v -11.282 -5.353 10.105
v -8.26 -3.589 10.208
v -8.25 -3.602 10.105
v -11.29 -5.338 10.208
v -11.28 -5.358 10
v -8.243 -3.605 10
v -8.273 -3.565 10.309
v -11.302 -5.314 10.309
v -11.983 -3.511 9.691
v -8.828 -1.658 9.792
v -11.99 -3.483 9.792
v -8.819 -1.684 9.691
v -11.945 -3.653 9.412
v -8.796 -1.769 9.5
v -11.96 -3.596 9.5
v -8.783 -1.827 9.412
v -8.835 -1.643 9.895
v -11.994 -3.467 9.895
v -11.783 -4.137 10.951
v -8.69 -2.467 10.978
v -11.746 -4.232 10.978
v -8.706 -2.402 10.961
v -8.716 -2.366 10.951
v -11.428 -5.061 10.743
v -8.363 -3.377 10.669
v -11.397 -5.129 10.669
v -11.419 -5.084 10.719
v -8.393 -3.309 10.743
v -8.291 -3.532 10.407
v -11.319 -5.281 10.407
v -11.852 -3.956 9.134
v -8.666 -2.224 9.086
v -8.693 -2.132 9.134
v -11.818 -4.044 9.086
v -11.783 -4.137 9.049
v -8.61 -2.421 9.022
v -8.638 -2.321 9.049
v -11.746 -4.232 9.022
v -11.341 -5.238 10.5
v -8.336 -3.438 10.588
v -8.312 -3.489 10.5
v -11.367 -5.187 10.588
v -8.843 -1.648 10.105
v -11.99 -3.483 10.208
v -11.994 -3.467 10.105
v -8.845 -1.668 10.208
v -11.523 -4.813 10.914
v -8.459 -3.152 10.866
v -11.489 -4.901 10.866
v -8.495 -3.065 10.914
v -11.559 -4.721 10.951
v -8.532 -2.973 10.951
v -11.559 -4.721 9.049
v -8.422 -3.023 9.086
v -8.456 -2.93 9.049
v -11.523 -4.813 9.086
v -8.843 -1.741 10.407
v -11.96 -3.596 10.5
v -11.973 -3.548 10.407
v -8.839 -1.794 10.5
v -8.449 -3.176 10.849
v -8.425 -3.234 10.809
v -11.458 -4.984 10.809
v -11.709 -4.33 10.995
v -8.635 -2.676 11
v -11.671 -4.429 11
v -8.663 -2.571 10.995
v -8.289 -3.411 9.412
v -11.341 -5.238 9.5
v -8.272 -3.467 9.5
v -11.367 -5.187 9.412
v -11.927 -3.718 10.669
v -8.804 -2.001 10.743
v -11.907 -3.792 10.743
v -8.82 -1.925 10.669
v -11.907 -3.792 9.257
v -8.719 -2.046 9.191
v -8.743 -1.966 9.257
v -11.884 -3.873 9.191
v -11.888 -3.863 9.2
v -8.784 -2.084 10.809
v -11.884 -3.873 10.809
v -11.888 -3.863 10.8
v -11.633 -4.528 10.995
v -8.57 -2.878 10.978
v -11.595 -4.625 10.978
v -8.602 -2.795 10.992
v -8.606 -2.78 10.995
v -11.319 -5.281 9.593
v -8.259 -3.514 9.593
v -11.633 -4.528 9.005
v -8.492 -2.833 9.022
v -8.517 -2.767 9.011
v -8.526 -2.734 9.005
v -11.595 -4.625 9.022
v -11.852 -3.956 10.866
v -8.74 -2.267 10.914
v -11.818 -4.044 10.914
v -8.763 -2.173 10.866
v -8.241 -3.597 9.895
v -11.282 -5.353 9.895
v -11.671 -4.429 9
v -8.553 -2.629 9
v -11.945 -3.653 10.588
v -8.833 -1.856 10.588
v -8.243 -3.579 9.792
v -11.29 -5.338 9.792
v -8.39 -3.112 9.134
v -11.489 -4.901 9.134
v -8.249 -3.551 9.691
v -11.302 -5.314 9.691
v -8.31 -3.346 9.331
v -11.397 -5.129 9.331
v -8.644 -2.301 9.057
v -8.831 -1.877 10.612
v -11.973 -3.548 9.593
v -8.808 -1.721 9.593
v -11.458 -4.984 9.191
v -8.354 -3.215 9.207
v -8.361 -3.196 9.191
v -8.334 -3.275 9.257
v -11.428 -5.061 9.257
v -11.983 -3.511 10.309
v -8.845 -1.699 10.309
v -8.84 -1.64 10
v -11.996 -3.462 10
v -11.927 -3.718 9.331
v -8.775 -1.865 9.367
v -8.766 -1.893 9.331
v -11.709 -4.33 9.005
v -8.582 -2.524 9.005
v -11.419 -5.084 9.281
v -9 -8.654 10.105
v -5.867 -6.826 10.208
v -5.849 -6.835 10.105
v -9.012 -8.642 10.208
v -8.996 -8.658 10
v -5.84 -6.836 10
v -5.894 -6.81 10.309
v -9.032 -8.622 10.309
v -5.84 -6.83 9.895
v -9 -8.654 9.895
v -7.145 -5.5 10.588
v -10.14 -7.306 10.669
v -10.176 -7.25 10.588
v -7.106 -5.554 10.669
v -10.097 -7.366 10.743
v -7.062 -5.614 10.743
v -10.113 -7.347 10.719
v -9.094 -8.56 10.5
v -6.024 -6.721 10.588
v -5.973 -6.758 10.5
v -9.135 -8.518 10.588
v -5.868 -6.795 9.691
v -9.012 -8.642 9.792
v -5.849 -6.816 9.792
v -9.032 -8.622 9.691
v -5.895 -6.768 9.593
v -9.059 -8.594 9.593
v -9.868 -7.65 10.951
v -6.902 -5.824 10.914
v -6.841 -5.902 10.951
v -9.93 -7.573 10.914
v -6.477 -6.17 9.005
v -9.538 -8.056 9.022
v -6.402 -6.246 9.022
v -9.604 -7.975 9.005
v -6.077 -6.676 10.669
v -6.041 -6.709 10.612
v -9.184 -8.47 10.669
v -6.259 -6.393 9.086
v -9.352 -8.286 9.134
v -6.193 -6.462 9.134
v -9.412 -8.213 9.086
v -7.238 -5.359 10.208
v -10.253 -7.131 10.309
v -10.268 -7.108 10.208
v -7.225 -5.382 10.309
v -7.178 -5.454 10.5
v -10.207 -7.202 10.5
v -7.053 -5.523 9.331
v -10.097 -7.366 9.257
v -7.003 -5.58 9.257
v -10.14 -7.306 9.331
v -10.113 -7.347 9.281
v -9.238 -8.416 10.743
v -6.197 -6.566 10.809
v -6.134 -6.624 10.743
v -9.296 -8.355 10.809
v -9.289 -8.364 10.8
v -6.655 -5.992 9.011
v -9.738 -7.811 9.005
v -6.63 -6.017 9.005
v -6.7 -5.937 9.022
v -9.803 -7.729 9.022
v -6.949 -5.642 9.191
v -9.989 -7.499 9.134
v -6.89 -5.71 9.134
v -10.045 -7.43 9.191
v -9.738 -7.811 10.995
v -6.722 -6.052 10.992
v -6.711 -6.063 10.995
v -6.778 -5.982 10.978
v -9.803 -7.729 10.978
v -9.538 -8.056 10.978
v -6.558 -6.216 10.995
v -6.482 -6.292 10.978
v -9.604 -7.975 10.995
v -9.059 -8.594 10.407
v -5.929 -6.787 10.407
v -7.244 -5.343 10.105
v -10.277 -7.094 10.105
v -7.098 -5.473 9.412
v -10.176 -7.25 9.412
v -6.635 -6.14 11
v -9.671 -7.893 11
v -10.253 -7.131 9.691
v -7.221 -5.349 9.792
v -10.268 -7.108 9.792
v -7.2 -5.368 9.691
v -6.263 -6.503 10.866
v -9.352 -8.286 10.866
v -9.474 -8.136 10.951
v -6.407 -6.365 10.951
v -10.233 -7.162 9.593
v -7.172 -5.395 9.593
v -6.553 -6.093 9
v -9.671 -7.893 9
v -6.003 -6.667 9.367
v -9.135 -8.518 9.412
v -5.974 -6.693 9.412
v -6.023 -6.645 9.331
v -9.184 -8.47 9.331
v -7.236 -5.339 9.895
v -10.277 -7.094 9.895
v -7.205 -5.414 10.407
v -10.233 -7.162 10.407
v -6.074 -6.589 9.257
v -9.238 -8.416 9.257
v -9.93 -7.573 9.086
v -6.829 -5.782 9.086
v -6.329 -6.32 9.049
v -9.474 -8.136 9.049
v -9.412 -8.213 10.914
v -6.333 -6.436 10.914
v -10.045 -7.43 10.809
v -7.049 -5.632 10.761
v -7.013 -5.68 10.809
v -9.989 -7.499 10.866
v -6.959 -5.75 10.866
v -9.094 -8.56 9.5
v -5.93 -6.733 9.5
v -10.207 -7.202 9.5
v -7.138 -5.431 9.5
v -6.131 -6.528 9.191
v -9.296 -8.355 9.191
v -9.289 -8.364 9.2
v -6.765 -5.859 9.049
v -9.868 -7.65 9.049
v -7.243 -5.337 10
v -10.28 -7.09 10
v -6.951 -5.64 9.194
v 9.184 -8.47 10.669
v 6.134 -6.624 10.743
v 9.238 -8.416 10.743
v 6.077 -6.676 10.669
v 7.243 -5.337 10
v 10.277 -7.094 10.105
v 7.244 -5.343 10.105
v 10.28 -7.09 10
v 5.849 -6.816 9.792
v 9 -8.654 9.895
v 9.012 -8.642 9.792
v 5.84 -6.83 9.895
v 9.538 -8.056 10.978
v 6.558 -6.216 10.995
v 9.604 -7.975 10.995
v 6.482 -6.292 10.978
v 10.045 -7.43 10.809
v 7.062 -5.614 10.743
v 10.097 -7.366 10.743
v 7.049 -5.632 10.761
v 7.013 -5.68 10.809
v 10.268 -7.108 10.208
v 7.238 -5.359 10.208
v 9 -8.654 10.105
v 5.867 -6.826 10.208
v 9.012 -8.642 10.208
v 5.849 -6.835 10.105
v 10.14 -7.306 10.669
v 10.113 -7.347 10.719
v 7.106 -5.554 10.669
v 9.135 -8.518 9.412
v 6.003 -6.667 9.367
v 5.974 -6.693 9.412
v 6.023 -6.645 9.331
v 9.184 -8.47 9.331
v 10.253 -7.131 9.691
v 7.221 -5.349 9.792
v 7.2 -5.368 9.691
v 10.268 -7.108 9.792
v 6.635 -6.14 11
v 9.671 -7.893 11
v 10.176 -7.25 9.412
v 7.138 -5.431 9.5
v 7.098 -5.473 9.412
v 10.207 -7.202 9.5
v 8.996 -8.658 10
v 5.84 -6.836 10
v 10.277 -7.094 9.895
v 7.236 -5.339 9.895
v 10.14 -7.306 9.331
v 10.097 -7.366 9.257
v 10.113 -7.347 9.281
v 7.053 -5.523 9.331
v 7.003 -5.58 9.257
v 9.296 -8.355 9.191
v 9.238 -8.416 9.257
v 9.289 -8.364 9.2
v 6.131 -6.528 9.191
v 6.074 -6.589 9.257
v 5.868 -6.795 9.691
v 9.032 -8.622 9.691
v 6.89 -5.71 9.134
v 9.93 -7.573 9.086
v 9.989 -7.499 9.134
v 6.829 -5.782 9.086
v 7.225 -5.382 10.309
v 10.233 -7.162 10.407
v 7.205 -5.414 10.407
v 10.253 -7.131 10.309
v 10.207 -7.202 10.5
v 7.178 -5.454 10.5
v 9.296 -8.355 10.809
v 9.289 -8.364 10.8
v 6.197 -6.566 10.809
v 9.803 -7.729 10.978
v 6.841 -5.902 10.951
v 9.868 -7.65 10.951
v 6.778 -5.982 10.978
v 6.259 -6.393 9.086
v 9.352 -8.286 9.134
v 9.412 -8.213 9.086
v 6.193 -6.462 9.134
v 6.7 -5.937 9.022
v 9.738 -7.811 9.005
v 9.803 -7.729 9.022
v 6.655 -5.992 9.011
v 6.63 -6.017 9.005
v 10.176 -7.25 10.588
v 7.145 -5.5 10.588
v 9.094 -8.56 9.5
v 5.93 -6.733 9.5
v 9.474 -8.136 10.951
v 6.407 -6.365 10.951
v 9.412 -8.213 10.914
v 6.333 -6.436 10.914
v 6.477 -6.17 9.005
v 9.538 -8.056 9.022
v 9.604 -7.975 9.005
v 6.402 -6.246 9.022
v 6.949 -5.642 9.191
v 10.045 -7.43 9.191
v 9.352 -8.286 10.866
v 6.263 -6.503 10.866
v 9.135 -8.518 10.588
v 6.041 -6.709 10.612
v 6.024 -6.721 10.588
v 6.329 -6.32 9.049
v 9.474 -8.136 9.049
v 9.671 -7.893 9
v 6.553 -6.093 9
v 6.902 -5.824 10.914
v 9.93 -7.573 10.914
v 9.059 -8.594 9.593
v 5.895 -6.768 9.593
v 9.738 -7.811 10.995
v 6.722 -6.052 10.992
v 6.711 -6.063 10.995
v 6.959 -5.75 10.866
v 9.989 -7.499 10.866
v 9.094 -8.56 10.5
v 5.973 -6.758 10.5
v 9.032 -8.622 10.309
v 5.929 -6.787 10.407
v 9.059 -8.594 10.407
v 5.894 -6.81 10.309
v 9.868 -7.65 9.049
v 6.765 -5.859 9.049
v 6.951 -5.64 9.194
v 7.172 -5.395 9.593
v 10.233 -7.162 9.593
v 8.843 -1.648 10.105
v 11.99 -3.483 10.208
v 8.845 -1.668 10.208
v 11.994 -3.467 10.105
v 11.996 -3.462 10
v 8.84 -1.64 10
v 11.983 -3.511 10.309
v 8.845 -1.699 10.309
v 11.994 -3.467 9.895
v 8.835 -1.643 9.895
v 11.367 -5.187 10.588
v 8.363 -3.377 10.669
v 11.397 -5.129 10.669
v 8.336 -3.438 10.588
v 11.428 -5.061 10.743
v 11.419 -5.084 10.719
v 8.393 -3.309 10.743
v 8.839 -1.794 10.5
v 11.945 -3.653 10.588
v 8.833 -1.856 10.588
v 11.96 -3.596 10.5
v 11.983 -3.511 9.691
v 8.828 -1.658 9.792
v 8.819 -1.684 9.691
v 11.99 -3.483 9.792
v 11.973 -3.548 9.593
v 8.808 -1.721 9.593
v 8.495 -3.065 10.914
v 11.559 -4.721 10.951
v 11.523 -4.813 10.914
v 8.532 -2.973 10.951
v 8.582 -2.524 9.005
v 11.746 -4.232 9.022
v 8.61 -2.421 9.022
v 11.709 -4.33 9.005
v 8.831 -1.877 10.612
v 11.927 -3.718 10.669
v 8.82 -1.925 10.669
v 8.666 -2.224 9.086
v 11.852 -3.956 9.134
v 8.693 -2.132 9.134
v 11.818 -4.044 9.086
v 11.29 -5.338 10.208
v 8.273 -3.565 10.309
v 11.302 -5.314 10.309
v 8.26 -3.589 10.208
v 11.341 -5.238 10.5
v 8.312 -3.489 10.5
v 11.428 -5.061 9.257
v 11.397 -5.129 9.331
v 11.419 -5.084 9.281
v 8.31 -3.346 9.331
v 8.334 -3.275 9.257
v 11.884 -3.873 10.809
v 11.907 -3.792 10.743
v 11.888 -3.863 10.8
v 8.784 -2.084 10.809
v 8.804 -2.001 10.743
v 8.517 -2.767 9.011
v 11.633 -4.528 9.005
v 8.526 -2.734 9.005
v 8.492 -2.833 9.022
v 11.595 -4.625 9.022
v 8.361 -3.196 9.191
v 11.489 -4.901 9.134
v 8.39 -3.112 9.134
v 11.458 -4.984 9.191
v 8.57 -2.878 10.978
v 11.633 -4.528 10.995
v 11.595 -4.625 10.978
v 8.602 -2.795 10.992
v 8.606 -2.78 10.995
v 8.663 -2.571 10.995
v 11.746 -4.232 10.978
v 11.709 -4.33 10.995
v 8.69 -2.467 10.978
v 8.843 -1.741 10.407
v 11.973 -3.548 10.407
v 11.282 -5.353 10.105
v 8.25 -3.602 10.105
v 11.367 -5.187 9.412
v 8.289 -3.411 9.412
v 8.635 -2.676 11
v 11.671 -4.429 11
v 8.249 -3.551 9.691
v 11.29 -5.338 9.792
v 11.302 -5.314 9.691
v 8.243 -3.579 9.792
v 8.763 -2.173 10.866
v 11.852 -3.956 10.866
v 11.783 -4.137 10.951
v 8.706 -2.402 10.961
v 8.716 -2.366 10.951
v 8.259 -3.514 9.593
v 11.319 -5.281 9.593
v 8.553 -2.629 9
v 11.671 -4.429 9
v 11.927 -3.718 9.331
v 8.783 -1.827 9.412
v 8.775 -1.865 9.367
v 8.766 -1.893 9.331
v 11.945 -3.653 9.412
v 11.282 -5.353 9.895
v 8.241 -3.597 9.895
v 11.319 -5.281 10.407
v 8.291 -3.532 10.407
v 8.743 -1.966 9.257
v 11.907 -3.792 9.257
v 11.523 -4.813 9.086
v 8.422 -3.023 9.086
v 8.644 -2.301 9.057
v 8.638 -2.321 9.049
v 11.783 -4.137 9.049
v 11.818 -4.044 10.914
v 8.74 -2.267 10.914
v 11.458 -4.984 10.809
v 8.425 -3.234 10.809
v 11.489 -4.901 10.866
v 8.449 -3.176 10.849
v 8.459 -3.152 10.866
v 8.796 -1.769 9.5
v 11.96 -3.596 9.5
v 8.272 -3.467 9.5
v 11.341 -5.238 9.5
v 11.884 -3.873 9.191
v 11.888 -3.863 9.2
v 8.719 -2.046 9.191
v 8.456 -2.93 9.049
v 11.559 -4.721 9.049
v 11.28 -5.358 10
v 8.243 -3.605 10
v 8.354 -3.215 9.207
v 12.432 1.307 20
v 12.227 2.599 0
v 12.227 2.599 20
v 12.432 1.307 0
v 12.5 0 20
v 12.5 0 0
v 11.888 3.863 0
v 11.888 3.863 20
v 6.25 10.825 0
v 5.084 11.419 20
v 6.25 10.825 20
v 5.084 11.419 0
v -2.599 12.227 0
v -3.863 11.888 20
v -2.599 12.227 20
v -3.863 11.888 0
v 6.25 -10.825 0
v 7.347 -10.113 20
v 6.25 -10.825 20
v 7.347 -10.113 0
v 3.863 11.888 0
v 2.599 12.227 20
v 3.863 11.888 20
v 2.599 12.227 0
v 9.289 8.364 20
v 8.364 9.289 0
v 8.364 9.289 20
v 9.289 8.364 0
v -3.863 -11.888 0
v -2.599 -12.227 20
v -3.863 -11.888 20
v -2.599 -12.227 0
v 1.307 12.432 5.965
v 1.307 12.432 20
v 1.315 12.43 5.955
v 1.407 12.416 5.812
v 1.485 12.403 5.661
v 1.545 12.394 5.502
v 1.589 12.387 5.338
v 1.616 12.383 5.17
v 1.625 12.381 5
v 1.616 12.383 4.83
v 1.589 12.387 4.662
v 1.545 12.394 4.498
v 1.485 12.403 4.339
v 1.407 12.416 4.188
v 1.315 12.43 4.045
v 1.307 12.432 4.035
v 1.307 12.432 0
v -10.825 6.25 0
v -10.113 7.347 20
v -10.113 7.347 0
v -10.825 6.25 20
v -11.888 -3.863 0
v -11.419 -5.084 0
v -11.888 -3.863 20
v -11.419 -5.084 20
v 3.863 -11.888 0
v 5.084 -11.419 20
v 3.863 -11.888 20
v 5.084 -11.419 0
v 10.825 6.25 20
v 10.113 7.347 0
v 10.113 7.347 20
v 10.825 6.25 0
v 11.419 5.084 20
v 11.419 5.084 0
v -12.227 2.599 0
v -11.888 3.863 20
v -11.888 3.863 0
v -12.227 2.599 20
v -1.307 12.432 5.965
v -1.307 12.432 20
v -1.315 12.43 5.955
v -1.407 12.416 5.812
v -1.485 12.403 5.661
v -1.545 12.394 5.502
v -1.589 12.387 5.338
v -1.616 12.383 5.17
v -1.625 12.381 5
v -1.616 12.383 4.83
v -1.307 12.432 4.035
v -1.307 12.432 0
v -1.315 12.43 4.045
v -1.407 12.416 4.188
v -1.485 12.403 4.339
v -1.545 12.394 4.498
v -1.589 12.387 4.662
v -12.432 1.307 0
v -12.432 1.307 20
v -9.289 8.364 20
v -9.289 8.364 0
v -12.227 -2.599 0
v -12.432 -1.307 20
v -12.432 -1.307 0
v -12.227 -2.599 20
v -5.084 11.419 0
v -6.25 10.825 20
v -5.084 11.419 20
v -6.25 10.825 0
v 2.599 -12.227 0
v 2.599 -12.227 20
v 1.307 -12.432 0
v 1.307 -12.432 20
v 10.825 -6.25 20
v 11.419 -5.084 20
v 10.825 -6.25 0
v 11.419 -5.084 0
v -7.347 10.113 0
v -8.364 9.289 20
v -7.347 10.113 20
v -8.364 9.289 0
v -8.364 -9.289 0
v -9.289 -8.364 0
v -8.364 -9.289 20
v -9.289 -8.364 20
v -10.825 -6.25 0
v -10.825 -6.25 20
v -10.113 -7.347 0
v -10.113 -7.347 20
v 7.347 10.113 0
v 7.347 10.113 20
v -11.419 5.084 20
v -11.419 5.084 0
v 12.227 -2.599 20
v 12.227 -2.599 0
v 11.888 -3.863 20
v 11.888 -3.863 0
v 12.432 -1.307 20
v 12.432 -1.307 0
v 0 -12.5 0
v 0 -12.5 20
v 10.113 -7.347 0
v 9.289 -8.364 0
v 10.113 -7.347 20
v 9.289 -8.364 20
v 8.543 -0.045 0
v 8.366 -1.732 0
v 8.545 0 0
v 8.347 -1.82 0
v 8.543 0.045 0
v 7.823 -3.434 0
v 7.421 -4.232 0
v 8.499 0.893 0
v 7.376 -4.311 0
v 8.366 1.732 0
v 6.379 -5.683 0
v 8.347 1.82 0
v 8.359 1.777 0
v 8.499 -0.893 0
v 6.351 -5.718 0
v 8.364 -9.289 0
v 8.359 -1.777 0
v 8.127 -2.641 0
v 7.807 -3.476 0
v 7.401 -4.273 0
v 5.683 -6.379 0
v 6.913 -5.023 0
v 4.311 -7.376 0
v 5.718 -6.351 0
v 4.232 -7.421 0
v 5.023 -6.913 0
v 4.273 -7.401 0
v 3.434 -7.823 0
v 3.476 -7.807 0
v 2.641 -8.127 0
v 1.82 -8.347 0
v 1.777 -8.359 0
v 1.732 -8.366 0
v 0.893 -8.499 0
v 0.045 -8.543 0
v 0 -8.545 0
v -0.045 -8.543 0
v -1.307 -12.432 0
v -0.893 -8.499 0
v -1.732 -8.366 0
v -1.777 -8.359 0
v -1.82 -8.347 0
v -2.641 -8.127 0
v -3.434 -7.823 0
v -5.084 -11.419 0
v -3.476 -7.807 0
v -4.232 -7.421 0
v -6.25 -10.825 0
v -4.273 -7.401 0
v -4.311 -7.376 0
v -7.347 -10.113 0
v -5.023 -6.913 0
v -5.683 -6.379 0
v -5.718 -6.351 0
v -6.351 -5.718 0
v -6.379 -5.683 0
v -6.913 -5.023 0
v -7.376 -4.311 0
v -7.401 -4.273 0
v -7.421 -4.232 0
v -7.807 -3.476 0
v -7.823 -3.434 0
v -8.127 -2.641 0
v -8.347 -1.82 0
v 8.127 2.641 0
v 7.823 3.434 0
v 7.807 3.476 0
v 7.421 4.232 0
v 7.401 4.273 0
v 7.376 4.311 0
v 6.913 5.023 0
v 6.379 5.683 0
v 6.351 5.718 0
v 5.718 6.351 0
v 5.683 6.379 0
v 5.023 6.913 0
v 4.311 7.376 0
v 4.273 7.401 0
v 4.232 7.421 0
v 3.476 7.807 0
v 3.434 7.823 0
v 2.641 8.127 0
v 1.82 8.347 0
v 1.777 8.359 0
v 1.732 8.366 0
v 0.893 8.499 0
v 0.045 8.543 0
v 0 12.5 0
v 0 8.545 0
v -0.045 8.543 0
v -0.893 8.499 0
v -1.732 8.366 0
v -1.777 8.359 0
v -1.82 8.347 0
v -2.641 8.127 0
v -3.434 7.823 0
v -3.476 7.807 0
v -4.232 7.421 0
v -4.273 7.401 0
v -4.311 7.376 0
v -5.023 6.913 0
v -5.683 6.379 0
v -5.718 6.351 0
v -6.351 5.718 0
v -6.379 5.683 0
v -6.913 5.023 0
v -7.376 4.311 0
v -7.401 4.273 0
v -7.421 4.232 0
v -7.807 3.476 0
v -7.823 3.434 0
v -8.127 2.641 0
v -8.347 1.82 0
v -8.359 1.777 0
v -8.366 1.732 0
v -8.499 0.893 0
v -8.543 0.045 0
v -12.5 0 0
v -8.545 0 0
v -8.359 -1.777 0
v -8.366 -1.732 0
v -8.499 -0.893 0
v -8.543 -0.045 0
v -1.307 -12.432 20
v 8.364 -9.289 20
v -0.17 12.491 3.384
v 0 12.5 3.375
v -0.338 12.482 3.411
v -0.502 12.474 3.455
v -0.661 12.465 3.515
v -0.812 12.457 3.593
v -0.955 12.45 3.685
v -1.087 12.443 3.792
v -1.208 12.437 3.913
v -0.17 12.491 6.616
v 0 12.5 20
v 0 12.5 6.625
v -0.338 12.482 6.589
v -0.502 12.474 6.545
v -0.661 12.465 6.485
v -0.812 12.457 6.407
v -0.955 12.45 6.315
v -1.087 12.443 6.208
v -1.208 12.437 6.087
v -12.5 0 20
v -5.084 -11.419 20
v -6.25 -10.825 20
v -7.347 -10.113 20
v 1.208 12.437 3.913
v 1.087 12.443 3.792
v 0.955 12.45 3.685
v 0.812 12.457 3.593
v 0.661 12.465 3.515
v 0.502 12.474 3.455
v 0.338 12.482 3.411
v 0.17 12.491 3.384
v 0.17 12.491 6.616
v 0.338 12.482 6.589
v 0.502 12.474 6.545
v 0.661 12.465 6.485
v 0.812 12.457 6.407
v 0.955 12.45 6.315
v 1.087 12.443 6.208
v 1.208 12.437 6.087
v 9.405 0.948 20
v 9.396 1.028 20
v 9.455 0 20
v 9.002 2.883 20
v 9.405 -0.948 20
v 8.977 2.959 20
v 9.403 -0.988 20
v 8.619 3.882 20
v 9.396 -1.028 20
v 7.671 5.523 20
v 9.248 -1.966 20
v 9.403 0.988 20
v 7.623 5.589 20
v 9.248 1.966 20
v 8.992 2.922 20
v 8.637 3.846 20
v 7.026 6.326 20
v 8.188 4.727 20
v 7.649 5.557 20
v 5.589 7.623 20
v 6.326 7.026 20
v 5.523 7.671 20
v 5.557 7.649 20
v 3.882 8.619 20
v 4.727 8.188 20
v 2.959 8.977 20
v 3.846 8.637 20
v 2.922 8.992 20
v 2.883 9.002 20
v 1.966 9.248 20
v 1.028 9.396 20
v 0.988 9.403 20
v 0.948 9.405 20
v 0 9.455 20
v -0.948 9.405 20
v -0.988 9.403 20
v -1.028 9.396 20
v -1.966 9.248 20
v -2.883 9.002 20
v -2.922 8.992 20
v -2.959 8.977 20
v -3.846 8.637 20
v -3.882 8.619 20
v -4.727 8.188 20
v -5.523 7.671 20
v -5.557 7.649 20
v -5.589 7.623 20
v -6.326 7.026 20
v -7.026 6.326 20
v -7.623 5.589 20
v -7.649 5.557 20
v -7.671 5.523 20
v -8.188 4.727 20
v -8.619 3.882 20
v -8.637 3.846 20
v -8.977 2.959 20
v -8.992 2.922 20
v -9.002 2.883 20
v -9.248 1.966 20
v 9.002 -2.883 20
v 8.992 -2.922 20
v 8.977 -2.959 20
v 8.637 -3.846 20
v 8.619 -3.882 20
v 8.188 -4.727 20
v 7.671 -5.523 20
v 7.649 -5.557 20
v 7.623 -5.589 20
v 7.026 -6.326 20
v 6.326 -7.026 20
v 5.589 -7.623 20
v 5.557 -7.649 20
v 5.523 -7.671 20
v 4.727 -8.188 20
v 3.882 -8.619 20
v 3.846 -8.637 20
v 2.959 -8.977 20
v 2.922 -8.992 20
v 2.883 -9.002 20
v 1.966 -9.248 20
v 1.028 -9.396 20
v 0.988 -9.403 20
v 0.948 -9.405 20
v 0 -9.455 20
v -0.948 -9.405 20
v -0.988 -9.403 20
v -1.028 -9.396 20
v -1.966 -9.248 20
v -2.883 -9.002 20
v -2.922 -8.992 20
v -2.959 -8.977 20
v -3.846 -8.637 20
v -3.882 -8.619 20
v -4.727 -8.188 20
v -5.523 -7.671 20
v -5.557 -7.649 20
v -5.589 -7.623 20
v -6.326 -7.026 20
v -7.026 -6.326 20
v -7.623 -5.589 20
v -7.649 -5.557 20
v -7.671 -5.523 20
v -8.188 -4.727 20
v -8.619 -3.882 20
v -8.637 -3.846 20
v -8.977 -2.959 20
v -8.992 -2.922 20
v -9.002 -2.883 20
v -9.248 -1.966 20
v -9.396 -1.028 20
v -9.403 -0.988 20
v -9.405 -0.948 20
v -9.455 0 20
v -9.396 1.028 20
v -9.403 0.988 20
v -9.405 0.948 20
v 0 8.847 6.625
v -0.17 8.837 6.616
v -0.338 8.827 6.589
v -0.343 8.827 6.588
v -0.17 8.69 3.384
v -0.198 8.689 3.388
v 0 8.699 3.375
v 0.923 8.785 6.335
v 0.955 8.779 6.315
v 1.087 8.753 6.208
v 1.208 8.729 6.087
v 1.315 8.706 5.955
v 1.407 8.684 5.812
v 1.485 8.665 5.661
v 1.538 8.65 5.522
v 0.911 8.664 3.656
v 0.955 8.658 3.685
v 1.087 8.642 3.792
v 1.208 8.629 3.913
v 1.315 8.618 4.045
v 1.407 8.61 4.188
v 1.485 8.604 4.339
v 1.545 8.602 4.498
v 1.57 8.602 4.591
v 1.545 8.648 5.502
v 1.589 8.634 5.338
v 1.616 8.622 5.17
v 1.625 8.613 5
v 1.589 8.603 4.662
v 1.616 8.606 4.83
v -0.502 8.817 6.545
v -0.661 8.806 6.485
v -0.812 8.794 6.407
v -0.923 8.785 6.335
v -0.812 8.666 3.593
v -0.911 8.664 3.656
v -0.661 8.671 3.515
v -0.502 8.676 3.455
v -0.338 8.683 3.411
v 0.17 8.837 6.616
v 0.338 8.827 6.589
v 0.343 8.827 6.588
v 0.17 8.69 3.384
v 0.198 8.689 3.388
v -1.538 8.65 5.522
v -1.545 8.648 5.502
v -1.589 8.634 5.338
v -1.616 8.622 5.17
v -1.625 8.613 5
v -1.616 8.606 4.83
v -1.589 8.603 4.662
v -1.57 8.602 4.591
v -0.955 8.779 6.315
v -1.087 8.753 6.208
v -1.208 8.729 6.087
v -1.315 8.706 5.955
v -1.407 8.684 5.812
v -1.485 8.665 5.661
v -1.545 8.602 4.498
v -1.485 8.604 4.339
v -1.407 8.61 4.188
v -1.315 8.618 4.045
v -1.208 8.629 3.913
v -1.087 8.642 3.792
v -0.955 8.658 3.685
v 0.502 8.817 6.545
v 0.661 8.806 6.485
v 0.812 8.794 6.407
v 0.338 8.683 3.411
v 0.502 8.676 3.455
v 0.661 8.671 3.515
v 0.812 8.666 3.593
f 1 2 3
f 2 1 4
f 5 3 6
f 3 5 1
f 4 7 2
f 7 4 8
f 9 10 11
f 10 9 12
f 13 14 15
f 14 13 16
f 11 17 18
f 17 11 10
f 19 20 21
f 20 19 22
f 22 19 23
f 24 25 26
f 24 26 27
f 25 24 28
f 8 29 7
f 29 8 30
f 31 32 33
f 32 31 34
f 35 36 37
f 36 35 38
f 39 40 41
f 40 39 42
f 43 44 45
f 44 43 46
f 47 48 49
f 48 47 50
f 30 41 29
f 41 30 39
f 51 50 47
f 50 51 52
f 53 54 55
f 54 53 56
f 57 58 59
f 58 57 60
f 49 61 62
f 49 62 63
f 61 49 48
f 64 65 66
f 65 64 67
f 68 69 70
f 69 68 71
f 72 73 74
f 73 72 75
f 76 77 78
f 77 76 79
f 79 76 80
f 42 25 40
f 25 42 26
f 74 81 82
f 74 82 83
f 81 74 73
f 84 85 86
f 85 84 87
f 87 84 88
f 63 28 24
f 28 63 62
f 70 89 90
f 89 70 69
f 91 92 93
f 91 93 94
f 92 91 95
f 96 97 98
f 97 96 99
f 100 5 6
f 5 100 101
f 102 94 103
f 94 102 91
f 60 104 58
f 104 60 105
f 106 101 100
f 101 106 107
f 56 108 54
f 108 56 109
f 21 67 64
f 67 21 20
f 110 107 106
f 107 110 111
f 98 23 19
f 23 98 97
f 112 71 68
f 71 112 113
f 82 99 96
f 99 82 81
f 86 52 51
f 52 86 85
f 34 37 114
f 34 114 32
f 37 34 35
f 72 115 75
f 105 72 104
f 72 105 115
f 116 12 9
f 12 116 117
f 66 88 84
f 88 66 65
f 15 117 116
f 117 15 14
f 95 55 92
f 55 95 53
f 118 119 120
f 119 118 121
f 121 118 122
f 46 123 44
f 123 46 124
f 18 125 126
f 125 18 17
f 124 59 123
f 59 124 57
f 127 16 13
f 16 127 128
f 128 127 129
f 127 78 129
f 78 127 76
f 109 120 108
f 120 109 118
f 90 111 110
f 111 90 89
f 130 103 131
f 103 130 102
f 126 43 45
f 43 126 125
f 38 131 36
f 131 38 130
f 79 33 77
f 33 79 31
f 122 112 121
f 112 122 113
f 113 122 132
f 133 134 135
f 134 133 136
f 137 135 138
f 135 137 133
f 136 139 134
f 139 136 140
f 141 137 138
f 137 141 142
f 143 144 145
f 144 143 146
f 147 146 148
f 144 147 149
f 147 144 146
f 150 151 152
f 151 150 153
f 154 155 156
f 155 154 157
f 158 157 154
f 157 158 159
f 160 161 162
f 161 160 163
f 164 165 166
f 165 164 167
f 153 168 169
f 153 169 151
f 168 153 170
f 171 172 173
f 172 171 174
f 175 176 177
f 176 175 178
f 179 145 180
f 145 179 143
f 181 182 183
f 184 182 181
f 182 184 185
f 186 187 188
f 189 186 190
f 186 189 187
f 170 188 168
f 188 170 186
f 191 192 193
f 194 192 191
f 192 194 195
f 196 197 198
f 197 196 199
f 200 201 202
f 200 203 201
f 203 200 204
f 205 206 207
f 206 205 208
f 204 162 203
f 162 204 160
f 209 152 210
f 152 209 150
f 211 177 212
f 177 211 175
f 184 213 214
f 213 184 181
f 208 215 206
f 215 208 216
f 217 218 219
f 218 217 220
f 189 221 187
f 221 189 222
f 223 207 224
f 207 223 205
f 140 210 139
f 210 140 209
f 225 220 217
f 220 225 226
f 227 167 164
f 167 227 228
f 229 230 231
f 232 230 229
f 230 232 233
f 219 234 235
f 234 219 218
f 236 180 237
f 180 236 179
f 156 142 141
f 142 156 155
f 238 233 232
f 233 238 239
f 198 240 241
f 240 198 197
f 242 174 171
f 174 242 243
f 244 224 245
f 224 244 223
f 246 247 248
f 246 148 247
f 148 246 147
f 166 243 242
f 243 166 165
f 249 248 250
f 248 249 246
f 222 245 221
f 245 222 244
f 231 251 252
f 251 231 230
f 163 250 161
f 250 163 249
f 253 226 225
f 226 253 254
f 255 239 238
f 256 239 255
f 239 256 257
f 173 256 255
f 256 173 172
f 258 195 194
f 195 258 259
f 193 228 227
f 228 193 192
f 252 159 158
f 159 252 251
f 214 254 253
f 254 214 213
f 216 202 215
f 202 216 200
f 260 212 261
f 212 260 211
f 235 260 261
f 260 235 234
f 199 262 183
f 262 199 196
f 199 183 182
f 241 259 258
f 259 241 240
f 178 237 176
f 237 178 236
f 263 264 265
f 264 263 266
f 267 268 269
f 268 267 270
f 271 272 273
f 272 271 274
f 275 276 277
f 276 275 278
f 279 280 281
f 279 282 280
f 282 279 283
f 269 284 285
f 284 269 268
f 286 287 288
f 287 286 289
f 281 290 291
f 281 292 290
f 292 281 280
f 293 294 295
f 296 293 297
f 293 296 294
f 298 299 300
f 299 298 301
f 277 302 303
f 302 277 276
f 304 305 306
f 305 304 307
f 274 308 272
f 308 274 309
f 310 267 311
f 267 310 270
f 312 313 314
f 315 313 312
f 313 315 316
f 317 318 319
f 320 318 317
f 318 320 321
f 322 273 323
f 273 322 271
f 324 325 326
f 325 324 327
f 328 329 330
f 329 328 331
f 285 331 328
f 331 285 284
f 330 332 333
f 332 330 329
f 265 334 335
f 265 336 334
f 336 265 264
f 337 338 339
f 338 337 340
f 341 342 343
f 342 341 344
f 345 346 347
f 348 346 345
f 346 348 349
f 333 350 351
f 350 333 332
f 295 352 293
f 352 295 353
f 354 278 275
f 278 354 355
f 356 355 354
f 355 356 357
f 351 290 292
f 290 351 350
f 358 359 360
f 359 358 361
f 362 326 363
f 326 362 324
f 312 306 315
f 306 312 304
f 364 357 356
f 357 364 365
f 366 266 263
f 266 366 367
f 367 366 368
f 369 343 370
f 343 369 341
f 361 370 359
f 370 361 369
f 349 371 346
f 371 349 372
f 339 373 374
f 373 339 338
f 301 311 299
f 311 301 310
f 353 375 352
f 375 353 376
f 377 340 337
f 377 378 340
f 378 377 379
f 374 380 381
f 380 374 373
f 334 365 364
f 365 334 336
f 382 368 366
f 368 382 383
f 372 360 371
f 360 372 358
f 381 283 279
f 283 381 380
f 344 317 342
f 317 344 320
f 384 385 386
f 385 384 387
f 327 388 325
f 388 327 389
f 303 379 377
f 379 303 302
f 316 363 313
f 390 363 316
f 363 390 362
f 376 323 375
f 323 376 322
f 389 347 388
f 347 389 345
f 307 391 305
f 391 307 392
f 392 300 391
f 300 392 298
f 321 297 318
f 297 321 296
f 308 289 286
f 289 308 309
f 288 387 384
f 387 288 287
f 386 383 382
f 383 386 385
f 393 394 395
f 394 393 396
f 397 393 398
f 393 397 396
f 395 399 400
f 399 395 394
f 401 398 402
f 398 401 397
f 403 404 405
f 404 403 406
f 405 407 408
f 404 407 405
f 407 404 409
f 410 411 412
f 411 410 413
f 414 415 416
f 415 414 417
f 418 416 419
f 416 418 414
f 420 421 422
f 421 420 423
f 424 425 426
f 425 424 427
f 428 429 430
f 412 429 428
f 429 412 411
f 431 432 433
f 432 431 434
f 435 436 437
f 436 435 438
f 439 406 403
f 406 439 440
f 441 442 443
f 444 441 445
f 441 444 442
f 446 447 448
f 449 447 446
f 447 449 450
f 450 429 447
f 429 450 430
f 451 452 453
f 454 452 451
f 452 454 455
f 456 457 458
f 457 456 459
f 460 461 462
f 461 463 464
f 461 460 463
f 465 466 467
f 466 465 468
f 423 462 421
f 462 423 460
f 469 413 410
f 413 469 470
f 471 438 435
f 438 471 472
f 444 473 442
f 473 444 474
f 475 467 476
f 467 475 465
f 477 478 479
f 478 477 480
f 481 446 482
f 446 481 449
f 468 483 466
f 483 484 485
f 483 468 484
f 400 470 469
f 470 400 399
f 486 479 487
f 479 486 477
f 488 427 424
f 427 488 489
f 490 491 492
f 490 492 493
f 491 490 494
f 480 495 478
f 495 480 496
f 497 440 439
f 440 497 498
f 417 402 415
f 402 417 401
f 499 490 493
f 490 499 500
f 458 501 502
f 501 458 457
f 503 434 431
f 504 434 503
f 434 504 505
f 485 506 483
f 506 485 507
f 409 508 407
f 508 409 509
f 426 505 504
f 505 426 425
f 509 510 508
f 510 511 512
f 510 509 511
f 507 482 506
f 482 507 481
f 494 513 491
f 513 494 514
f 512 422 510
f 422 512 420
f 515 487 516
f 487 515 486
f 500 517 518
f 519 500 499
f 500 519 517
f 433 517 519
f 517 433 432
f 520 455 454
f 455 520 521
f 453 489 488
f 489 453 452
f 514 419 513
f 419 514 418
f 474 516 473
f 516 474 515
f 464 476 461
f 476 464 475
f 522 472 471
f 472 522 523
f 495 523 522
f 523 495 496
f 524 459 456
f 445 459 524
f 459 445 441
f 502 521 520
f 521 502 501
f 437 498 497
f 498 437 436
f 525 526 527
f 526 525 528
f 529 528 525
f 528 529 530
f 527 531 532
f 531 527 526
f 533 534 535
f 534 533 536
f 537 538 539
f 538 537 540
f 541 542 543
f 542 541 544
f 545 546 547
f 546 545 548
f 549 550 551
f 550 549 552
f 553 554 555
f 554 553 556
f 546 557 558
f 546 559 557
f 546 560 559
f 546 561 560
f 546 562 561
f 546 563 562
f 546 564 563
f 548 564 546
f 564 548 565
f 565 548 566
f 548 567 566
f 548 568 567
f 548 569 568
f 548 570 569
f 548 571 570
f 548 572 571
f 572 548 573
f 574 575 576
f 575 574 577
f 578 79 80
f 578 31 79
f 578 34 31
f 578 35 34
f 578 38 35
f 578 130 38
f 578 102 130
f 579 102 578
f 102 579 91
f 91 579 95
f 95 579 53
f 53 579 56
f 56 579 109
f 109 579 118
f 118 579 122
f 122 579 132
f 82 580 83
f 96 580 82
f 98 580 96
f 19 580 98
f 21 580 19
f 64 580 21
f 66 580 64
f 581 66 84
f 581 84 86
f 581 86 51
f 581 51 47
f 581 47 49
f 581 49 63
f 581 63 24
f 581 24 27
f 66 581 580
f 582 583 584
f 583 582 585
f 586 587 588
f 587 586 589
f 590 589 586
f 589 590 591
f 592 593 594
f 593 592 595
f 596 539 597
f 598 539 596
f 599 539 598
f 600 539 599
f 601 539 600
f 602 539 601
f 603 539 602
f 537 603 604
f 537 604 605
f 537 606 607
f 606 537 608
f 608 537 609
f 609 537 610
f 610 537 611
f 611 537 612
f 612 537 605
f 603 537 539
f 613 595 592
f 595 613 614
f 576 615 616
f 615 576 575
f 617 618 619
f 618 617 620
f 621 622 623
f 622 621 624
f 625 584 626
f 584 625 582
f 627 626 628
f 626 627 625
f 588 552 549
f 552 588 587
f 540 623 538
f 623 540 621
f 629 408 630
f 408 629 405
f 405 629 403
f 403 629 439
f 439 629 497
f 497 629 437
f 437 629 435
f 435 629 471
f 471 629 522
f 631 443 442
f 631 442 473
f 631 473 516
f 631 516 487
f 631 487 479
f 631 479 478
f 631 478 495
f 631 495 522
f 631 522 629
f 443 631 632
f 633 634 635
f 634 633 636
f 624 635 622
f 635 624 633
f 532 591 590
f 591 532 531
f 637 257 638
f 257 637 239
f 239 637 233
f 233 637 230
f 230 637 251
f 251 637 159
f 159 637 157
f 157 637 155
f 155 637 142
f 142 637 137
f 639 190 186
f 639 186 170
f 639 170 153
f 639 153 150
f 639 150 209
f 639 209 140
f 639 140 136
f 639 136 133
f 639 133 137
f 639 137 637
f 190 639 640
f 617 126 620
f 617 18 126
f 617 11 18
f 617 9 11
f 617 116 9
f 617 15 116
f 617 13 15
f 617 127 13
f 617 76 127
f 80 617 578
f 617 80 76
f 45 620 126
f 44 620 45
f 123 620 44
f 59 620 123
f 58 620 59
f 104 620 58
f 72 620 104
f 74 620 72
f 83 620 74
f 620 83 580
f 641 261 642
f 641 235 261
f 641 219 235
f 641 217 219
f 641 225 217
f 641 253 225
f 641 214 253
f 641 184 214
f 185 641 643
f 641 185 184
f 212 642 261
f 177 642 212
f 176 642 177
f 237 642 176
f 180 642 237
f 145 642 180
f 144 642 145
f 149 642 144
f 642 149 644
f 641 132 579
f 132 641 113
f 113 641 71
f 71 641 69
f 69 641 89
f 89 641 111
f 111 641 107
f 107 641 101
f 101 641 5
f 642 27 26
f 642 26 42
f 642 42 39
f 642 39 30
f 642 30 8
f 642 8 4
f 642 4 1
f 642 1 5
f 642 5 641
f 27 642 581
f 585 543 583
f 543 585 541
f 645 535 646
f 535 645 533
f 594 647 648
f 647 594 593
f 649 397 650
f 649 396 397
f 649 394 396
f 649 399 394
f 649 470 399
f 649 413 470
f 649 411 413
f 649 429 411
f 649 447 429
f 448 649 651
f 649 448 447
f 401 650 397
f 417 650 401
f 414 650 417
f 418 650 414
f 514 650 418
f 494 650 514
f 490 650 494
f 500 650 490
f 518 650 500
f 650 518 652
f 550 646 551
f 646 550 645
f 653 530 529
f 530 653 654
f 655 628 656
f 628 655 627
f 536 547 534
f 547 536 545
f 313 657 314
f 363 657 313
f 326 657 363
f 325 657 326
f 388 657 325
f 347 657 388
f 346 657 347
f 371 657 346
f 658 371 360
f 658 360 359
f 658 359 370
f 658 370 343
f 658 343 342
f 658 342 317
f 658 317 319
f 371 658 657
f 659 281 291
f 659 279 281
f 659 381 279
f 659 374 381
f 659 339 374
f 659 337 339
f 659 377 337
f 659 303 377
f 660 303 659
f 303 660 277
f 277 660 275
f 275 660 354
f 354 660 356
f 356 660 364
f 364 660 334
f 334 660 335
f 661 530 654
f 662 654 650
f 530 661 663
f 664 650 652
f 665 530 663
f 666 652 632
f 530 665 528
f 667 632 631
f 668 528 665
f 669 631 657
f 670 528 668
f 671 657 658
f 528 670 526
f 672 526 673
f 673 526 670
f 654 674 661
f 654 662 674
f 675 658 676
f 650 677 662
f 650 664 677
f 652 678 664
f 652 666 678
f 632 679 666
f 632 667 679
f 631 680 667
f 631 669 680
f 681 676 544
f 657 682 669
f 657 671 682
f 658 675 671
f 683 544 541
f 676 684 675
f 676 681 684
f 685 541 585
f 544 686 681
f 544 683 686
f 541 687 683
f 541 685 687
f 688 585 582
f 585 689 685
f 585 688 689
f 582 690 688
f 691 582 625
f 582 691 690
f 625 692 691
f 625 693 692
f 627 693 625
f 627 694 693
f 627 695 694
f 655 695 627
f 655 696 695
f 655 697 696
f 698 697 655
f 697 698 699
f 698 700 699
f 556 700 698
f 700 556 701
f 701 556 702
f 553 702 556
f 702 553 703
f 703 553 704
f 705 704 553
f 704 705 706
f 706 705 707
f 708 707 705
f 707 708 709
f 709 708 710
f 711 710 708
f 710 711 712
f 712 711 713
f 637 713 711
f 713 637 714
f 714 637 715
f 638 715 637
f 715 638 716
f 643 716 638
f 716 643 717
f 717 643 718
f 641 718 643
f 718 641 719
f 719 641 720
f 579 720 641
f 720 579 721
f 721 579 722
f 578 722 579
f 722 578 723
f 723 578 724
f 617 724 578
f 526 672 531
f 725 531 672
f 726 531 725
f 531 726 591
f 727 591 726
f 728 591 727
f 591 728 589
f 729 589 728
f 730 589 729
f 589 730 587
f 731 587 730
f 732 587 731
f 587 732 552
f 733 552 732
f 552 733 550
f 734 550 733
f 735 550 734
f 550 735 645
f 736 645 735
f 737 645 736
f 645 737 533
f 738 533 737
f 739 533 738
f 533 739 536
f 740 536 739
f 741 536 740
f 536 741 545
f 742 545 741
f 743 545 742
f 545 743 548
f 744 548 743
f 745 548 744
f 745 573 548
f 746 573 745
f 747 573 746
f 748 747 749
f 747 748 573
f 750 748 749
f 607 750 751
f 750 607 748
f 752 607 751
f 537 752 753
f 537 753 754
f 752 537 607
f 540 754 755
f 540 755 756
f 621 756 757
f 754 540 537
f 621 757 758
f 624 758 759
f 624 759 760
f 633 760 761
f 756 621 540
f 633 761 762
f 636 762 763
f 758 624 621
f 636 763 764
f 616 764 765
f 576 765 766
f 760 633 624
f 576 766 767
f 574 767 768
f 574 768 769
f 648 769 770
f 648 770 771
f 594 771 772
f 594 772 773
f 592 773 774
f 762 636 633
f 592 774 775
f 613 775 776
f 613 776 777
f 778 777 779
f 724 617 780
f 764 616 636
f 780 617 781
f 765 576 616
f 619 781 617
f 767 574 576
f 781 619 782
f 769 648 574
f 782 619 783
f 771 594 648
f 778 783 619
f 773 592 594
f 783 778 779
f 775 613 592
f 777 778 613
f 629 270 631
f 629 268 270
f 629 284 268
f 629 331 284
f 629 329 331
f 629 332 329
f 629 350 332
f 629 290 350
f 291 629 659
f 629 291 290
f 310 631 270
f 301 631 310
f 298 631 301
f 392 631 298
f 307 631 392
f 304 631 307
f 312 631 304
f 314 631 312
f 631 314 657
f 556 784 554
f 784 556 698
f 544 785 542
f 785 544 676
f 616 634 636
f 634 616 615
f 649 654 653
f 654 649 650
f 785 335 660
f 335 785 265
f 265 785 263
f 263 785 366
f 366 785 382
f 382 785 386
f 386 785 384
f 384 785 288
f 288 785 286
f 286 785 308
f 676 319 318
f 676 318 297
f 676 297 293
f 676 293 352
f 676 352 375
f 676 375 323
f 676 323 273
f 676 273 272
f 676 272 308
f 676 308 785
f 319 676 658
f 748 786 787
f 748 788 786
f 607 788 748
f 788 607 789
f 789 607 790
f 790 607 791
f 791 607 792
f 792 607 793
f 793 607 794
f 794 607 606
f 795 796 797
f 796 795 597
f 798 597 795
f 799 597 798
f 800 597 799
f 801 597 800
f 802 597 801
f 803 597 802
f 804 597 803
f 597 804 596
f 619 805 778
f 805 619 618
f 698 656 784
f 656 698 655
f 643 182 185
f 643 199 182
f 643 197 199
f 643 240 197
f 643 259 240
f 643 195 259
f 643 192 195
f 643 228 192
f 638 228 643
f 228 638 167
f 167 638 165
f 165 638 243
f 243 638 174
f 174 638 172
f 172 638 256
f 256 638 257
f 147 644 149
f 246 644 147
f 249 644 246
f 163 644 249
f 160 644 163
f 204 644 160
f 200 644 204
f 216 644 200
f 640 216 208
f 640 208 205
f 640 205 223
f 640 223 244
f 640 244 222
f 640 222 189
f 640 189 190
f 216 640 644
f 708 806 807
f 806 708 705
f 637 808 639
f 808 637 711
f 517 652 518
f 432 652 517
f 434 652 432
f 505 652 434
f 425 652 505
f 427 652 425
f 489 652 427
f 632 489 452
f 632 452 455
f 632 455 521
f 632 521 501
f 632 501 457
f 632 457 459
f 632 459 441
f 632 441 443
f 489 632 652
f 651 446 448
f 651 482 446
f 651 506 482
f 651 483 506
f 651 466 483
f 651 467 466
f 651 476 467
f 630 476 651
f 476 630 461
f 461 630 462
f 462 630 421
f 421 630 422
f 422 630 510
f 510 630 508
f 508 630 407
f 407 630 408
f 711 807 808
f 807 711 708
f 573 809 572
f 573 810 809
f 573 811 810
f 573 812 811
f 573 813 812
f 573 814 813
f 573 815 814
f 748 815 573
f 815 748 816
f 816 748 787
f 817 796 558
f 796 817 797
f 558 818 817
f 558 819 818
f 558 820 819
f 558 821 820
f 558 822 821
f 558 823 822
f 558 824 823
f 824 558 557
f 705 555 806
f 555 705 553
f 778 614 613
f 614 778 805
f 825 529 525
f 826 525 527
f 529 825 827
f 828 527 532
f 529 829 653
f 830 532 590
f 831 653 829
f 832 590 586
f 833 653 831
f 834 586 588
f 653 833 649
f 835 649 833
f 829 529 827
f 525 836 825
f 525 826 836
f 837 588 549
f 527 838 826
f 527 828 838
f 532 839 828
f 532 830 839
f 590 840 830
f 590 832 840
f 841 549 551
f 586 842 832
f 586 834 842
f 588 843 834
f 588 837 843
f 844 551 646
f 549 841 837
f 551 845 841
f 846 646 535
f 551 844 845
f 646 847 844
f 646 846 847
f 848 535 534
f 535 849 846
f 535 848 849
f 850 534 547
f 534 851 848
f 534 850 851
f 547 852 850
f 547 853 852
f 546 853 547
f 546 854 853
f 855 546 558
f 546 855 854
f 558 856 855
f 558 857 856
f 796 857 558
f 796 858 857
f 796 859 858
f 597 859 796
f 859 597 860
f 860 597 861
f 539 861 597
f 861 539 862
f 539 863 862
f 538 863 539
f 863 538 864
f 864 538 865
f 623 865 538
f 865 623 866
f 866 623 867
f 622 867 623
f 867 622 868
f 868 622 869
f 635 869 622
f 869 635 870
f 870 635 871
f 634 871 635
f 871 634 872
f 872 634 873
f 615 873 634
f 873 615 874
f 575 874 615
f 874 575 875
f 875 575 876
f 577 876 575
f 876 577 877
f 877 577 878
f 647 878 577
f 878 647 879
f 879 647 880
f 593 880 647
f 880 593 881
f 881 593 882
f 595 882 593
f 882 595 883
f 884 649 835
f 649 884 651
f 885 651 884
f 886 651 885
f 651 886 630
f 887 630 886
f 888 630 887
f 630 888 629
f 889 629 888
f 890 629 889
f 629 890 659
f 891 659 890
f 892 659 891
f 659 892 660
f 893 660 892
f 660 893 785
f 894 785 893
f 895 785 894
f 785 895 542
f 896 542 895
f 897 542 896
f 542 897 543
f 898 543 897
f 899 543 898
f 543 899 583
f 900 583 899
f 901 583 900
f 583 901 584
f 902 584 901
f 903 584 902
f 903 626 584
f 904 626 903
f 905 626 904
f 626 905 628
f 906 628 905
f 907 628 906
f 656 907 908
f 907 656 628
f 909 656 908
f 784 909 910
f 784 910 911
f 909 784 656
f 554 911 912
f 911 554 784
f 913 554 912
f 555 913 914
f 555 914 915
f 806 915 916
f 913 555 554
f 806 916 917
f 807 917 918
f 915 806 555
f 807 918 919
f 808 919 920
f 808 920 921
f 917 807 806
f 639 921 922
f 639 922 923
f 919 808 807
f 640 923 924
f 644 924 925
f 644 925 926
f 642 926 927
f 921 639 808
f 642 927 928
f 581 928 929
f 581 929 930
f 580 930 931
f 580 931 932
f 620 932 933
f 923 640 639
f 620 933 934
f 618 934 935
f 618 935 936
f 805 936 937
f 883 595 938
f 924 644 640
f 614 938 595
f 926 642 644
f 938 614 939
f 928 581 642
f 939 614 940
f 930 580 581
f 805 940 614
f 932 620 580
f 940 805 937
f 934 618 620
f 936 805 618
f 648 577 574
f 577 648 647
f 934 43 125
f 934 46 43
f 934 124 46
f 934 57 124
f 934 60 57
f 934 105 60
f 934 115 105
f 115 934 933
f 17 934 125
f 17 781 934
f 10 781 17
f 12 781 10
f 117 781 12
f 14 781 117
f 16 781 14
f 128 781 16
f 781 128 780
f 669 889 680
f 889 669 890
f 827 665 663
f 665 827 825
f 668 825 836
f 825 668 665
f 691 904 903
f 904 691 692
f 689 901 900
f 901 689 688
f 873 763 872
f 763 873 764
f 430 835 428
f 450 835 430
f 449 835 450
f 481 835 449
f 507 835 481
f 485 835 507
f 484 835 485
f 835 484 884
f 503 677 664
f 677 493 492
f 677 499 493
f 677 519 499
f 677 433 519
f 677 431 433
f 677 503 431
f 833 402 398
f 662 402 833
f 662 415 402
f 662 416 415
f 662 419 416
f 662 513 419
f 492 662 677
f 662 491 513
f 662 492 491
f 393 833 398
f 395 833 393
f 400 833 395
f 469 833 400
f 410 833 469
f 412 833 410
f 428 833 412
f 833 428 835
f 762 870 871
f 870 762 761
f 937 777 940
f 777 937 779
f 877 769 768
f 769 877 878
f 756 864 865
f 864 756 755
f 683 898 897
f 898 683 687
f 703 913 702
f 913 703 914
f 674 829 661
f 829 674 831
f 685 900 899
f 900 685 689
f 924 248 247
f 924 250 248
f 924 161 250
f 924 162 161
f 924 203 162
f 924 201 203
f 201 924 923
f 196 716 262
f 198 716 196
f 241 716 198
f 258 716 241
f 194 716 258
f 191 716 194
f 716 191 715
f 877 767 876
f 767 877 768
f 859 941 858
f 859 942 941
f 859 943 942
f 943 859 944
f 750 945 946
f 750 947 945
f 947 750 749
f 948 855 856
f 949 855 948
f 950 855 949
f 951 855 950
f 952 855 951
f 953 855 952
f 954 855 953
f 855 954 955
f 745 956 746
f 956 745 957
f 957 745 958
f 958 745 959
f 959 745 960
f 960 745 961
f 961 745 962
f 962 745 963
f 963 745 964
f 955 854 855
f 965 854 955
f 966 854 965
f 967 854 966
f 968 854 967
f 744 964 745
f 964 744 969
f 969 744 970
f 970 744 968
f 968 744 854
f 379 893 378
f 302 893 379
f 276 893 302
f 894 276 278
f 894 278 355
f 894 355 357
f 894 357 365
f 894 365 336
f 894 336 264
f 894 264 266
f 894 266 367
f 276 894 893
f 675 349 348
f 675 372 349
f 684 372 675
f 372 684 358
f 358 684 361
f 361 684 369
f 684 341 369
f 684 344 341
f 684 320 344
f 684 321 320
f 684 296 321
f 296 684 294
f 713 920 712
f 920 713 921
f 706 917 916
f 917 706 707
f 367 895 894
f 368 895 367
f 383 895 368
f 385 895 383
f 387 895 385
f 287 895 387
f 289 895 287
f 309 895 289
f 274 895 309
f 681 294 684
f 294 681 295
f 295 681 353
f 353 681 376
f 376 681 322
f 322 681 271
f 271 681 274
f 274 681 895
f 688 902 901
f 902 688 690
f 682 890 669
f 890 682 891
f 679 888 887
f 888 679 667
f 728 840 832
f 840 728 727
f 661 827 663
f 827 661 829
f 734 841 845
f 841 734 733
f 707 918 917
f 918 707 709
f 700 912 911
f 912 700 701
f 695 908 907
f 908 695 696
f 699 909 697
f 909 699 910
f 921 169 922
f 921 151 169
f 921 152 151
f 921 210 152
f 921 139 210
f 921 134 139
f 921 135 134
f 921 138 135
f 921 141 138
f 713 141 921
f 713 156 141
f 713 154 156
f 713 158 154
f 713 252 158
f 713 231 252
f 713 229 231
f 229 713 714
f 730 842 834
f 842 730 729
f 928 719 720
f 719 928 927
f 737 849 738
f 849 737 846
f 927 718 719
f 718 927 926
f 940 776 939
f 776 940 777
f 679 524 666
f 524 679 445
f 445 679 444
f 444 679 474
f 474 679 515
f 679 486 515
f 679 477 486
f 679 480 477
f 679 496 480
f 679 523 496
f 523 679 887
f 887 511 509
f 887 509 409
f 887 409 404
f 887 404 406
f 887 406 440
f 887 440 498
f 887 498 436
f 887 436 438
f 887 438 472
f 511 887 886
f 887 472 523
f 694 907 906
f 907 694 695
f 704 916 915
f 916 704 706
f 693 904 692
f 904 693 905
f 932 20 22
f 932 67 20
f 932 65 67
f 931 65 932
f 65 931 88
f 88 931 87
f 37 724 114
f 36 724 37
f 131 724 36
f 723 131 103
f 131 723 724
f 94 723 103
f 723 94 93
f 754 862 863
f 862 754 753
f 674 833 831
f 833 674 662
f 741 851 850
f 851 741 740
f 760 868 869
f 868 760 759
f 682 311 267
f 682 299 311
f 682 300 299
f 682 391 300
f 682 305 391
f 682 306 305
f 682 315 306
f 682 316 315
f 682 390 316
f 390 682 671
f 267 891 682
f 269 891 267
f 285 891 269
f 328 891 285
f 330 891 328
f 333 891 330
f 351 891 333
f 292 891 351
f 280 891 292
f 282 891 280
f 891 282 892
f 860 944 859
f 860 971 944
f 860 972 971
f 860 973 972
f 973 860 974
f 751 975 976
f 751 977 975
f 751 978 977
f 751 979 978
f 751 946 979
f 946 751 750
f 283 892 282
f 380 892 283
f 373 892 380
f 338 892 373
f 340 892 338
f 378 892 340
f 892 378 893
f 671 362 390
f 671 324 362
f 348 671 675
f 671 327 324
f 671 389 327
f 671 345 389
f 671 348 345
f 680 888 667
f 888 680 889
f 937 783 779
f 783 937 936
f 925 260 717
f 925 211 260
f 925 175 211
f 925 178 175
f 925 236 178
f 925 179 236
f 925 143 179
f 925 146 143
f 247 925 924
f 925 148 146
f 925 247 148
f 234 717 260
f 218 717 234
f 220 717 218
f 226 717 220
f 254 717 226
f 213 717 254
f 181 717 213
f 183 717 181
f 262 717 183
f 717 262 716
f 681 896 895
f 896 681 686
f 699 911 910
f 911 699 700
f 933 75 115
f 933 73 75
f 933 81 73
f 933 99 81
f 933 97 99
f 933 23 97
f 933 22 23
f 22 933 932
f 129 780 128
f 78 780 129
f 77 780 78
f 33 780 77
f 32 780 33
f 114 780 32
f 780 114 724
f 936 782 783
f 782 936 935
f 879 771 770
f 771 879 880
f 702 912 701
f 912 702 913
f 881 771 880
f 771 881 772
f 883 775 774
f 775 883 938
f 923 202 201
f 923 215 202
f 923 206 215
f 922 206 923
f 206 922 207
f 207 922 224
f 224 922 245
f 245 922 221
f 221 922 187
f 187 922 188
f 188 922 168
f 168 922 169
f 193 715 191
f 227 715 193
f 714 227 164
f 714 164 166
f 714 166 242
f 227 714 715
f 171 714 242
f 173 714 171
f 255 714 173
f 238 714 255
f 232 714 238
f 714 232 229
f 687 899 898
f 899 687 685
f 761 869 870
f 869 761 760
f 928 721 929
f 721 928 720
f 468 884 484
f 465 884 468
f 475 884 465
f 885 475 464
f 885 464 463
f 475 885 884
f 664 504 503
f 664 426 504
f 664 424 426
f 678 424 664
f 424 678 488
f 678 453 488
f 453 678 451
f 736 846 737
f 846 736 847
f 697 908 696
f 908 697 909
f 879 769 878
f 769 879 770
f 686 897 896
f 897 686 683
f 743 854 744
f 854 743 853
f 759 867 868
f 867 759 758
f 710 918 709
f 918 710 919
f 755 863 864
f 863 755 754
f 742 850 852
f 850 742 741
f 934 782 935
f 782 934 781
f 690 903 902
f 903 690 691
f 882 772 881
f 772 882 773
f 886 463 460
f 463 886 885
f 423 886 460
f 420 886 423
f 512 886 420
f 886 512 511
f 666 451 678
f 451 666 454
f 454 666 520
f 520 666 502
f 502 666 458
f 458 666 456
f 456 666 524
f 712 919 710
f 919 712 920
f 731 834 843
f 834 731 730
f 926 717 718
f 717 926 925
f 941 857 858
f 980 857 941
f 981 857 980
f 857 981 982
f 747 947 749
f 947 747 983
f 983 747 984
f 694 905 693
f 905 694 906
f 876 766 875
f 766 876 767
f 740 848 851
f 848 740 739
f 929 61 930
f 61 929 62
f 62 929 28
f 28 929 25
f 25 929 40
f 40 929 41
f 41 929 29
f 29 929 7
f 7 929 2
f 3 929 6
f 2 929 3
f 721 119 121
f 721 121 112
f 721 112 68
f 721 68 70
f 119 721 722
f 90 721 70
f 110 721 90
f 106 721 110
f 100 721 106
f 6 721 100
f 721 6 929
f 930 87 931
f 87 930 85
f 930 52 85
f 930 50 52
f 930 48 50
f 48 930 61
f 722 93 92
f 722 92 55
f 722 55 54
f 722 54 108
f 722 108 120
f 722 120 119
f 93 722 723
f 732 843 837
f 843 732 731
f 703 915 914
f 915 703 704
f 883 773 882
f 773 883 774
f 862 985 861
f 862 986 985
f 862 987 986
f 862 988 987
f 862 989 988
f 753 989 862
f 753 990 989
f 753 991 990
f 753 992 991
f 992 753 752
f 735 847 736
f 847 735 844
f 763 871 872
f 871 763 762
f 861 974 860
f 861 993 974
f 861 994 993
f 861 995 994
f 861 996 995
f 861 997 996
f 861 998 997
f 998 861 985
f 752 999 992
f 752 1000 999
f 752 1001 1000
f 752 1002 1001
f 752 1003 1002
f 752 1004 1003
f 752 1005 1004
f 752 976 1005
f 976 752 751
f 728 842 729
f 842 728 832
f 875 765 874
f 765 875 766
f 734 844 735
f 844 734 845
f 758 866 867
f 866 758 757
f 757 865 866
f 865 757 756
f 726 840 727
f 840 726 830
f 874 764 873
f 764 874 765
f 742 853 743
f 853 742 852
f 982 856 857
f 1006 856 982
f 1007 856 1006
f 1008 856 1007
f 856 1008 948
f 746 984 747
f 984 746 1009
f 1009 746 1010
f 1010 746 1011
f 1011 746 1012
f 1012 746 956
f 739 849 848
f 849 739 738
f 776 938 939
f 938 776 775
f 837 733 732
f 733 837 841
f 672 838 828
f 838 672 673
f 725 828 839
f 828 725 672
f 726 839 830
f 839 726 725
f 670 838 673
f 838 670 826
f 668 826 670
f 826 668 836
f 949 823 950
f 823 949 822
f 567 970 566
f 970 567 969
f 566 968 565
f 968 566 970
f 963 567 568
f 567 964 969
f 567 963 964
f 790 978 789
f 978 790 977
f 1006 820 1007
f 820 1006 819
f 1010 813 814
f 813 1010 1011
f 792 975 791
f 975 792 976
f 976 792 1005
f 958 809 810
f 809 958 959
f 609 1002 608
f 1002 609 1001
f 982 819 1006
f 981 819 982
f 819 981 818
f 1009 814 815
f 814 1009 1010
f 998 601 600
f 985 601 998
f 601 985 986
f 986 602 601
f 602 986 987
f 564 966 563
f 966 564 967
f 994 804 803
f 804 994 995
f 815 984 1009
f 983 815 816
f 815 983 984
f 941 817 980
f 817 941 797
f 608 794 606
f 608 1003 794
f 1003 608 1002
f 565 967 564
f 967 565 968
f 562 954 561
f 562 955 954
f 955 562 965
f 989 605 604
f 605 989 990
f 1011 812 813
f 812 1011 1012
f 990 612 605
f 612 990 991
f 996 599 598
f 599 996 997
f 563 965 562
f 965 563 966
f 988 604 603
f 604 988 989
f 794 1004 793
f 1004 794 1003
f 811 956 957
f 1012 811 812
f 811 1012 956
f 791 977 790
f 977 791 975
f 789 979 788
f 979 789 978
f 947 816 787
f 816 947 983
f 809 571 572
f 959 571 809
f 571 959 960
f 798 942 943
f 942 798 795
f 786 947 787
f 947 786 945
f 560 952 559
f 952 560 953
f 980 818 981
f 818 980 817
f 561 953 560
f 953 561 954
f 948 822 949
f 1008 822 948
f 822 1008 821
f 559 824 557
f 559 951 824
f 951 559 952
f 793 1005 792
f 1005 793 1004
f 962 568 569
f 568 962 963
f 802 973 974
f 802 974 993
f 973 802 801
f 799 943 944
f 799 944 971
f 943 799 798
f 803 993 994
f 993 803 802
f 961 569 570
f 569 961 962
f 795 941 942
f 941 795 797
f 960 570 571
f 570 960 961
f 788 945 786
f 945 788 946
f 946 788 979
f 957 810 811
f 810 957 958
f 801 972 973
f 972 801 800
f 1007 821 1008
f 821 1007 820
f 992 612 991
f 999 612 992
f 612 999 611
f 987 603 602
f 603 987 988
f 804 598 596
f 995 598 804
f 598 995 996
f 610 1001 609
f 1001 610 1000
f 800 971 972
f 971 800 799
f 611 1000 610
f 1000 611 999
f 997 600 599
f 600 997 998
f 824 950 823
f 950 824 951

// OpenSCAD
// Holds a standard Expo whiteboard marker
// tapers from 16 to 17 mm

$fn=60;

// Pen holder in the middle
render() difference()
{
	// outside
	cylinder(d=25, h=20);

	// shaft
	translate([0,0,-1]) cylinder(d1=17, d2=19, h=22);

	// M3 set screw, just in case
	translate([0,5,5])
	rotate([-90,0,0])
	cylinder(d=3.25, h=10);

translate([0,0,10]) 
for(angle=[-60,60])
{
rotate([90,0,angle]) {
	translate([-2,0,0]) cylinder(d=2, h=20);
	translate([+2,0,0]) cylinder(d=2, h=20);
}
}
}



/*
// outer ring
render() difference()
{
	cylinder(d=100, h=2);
	translate([0,0,-1]) cylinder(d=90, h=4);
}


// spokes
for(a=[0,120,240])
rotate([0,0,a])
render() difference()
{
	translate([0,55/2,1]) cube([10,38,2], center=true);

	// mounting holes for the wires
	for(i=[20,30,40])
		translate([0,i,-1]) cylinder(d=2, h=4);
}
*/
